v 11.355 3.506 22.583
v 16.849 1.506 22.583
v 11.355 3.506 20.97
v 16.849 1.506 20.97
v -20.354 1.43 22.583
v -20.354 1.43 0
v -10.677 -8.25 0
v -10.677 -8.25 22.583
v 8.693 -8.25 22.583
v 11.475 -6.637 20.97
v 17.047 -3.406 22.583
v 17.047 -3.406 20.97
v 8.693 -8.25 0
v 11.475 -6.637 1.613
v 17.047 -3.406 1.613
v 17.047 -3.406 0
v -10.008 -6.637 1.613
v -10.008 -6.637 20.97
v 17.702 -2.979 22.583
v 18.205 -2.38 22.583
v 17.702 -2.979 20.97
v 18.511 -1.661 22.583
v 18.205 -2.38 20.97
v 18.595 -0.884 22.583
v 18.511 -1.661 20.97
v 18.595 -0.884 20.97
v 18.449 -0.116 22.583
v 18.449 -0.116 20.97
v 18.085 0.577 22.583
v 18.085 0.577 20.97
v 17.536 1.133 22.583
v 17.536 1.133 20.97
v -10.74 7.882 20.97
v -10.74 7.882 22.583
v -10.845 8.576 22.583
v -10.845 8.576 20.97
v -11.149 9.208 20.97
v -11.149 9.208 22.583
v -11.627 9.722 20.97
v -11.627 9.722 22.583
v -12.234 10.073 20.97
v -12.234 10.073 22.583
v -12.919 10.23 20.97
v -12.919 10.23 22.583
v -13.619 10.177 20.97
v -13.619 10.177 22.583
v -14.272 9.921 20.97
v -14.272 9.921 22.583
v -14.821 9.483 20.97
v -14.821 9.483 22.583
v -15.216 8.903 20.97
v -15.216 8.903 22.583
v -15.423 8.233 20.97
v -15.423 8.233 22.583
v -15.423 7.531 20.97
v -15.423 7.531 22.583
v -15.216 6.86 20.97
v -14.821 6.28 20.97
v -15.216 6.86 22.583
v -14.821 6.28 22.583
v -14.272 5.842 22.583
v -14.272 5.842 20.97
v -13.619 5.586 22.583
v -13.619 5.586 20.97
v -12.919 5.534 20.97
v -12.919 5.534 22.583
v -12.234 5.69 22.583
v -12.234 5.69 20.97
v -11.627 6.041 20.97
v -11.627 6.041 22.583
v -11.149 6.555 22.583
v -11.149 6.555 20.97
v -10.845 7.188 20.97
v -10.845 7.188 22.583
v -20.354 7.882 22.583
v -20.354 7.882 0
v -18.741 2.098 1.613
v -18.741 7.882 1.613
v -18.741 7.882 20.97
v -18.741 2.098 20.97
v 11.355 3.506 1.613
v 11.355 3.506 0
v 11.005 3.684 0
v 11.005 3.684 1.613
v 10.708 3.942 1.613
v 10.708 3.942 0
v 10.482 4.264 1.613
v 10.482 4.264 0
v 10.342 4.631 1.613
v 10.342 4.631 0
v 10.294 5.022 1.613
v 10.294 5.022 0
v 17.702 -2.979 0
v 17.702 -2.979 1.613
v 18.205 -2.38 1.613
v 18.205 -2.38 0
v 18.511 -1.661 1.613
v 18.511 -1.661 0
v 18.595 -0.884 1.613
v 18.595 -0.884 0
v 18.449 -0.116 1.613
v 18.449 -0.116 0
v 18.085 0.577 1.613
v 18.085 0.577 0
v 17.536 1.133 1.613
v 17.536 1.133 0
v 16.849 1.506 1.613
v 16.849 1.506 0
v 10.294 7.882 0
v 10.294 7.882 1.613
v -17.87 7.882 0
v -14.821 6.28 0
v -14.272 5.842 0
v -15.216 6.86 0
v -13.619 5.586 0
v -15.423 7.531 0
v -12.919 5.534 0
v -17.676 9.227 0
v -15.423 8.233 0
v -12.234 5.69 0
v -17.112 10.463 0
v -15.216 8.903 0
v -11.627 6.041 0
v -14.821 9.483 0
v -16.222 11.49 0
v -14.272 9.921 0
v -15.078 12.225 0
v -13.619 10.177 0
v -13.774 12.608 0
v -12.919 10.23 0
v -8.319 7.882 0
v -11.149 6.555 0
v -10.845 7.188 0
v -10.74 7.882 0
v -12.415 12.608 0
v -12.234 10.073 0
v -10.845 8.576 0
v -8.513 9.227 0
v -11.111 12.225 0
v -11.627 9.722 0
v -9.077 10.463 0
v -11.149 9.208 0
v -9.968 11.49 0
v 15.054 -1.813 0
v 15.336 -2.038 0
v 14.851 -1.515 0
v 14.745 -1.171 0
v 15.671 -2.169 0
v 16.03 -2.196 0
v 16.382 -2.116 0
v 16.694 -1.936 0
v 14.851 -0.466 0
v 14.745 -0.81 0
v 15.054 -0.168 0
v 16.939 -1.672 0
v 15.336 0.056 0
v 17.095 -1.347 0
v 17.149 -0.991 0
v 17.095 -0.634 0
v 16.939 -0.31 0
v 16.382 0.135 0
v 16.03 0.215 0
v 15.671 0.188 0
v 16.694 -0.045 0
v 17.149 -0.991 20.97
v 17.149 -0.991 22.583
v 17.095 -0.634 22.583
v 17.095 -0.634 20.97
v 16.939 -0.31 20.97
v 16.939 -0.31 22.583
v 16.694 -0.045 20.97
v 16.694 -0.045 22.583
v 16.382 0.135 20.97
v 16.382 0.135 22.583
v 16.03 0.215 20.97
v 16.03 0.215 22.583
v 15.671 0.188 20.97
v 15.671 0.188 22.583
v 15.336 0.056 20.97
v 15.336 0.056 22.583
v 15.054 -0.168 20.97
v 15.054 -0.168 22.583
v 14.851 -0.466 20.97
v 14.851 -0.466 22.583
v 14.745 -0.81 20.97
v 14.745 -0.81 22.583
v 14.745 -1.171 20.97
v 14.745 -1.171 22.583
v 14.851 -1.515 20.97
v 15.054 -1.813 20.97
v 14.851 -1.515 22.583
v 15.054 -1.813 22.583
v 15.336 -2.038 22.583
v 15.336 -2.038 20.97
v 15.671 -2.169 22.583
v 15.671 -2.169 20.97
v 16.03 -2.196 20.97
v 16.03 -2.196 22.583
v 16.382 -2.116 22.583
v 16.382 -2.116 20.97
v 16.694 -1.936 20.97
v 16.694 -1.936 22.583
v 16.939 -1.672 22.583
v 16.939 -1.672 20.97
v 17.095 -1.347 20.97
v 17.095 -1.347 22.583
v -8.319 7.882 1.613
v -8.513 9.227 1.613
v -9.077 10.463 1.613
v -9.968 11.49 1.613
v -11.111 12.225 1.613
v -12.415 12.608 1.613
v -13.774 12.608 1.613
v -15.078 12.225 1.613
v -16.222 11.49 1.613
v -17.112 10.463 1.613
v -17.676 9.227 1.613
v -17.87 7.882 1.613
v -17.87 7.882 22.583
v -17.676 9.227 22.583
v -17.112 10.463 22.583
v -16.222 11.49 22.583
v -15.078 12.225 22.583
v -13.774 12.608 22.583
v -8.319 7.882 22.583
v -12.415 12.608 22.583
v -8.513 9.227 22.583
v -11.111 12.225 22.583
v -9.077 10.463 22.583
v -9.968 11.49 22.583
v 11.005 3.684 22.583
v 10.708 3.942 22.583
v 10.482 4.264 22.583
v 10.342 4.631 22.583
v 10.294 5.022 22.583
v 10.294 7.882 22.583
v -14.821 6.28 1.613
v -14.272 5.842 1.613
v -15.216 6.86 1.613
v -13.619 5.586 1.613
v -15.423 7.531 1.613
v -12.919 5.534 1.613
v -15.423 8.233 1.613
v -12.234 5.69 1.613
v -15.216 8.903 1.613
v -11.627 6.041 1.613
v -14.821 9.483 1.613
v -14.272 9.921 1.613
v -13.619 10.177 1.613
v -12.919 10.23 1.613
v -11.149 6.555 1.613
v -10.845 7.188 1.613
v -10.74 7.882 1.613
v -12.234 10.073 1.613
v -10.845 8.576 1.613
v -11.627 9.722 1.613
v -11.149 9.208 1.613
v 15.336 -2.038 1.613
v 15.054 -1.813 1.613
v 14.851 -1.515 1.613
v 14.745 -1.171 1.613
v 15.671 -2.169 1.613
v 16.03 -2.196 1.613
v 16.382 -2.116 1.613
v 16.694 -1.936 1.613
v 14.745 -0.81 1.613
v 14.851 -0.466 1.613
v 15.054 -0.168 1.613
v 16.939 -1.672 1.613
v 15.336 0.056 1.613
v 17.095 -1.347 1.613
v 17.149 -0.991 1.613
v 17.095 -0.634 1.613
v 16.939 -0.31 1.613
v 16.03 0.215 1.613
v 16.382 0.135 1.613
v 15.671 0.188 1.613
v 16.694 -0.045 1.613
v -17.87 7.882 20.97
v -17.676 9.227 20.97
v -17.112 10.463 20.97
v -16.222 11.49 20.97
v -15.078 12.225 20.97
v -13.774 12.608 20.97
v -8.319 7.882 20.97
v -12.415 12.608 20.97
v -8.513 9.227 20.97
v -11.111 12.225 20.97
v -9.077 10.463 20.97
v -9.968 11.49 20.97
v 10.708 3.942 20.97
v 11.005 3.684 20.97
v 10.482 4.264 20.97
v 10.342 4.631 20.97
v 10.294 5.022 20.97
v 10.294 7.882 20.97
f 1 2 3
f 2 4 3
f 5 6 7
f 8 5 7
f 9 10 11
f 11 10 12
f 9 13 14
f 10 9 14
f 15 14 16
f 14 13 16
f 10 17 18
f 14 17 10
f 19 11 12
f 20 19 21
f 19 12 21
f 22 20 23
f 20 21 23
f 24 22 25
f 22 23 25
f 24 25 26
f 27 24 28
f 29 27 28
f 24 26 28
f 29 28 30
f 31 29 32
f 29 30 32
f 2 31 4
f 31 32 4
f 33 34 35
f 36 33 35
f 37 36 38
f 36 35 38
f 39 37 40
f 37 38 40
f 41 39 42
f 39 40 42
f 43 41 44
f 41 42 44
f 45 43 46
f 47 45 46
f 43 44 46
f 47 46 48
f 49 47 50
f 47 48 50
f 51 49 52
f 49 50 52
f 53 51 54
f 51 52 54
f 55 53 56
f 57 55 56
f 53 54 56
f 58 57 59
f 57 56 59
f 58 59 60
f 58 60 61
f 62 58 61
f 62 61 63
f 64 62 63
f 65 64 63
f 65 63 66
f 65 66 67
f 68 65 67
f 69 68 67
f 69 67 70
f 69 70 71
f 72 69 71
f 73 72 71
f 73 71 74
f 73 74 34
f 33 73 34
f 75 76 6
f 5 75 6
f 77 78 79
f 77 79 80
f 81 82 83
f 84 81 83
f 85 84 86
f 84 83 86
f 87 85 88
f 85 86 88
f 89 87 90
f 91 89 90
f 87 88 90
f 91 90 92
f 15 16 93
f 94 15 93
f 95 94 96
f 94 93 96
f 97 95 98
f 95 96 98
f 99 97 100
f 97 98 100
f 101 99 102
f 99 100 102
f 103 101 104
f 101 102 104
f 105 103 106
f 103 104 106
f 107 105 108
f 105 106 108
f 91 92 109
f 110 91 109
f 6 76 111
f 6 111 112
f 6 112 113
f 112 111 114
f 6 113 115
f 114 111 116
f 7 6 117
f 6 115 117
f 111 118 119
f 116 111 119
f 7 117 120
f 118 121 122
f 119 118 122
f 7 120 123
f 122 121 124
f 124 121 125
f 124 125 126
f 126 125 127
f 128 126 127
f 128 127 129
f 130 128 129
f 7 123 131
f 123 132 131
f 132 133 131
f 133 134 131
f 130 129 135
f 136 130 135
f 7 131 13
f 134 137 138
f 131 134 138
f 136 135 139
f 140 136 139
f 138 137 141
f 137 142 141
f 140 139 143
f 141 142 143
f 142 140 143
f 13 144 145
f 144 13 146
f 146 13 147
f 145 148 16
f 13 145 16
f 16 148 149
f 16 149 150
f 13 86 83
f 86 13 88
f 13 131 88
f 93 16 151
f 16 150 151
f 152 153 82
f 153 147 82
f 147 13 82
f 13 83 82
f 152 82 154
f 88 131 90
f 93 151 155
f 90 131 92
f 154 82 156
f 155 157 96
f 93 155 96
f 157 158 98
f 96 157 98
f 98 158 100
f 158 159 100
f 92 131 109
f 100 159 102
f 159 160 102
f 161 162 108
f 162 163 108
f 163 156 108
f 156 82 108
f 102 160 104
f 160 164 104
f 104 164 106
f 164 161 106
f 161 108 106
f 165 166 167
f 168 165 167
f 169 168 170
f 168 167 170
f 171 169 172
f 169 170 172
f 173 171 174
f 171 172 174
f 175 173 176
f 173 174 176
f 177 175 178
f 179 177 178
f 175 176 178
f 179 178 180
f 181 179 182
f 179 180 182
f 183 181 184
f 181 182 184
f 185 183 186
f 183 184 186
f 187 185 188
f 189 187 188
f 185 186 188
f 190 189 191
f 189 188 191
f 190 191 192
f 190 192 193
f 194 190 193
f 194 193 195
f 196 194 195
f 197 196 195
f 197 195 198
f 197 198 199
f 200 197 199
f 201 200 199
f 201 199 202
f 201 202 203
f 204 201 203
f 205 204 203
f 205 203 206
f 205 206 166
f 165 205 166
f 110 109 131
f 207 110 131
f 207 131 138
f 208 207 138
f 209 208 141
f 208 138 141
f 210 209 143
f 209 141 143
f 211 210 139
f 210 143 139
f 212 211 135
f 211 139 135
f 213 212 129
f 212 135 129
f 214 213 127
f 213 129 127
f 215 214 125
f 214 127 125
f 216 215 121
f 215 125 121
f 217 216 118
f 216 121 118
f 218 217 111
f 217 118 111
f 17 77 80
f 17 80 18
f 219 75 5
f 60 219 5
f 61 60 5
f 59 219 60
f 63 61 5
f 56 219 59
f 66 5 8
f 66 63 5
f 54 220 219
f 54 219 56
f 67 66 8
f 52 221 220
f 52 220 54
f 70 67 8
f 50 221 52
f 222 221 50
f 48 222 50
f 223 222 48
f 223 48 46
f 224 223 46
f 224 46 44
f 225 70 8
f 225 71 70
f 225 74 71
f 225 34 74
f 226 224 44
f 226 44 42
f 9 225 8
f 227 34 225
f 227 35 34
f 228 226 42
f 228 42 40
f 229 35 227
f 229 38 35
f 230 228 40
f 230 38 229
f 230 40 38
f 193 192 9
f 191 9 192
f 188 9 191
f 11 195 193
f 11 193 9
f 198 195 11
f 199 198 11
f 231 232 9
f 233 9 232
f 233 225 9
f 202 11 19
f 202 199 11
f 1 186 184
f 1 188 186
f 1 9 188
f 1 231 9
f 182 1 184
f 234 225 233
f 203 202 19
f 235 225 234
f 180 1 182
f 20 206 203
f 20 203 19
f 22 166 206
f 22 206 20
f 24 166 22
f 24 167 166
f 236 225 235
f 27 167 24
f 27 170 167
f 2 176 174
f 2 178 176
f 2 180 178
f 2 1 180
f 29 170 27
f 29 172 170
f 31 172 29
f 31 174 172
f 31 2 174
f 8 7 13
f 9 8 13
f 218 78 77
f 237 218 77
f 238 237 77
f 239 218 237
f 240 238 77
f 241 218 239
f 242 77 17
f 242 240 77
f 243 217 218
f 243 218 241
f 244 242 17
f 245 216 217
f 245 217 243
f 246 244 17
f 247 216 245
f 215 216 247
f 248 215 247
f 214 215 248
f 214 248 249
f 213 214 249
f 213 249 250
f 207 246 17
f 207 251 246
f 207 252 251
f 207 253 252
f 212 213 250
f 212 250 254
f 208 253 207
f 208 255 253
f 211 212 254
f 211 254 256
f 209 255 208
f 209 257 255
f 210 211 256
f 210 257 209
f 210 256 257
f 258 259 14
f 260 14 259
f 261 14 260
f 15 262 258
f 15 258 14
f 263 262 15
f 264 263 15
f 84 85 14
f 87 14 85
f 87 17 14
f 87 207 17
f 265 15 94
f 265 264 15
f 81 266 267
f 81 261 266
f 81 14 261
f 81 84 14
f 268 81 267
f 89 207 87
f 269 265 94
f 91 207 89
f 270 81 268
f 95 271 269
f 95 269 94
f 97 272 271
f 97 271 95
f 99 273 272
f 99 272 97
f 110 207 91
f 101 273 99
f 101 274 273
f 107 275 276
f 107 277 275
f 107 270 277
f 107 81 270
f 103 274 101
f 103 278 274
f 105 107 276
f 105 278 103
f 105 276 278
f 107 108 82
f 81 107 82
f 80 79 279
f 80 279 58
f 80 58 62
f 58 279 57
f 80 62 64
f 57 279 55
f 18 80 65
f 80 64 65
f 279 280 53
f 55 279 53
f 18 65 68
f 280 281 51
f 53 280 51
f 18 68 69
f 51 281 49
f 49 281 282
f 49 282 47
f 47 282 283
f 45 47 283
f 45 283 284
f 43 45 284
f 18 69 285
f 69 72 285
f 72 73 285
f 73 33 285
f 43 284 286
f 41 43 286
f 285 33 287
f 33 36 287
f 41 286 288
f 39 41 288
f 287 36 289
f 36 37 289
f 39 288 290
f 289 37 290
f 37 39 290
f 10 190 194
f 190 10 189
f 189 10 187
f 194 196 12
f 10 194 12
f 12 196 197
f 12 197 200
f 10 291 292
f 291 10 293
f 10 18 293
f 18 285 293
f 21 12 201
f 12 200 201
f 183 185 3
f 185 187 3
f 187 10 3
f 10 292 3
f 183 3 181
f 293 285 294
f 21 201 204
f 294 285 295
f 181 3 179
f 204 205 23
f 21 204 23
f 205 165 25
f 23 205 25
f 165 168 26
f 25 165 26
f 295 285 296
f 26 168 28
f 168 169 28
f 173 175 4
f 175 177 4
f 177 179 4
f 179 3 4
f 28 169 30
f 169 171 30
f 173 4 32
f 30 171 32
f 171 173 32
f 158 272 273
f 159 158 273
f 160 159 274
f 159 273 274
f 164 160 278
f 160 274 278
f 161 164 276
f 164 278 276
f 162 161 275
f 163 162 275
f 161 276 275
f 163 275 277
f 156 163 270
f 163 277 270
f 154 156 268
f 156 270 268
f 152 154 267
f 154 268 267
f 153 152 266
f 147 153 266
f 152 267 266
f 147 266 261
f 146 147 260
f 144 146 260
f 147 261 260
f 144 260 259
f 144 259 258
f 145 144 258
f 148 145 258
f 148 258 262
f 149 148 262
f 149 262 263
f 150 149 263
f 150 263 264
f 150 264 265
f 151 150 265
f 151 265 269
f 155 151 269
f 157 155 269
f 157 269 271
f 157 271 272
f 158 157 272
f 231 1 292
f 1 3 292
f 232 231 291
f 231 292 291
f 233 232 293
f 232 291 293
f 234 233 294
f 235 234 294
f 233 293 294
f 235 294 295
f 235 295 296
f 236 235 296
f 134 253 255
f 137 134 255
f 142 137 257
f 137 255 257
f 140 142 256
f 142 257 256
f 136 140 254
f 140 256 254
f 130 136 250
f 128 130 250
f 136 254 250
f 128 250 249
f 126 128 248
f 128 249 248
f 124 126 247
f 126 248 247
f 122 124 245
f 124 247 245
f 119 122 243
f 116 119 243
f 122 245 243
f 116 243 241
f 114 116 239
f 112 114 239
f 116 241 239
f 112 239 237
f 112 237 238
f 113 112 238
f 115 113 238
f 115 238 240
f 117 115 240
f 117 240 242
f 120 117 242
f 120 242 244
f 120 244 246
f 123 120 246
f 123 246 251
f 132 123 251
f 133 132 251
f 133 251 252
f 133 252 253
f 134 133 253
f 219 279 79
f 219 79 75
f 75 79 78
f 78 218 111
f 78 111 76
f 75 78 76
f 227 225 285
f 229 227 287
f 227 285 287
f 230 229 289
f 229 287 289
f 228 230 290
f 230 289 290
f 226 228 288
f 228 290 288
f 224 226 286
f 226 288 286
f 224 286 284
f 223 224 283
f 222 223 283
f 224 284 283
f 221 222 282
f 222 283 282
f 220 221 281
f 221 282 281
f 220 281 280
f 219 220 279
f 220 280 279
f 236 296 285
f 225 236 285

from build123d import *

# Parameters (mm, degrees)
BOSS_EXTRUDE2_DEPTH = 22.58314
SHELL3_T            = -1.6129
SKETCH2_R           = 2.35458
SKETCH2_R_2         = 1.20904
CUT_EXTRUDE1_DEPTH  = 23.58314


with BuildPart() as part:
    # Sketch1 → Boss-Extrude2 (new body)
    with BuildSketch(Plane.XY):
        with BuildLine():
            Line((-17.869818431, 7.881581433), (-20.353938431, 7.881581433))
            Line((-20.353938431, 7.881581433), (-20.353938431, 1.429981433))
            Line((-20.353938431, 1.429981433), (-10.676538431, -8.249958567))
            Line((-10.676538431, -8.249958567), (8.693302541, -8.249958567))
            Line((8.693302541, -8.249958567), (17.046970588, -3.405940625))
            ThreePointArc((17.046970588, -3.405940625), (18.594805131, -0.883615337), (16.848949341, 1.505925245))
            Line((16.848949341, 1.505925245), (11.35487534, 3.505941031))
            ThreePointArc((11.35487534, 3.505941031), (10.585366229, 4.096455714), (10.293701569, 5.021541433))
            Line((10.293701569, 5.021541433), (10.293701569, 7.881581433))
            Line((10.293701569, 7.881581433), (-8.319418431, 7.881581433))
            ThreePointArc((-8.319418431, 7.881581433), (-13.094618431, 12.656781433), (-17.869818431, 7.881581433))
        make_face()
    extrude(amount=BOSS_EXTRUDE2_DEPTH)

    # Shell3
    shell3_openings = [part.faces().sort_by_distance(p)[0] for p in [
        (0.987141569, 7.881581433, 11.29157),
        (10.293701569, 6.451561433, 11.29157),
        (10.704827342, 4.180098473, 11.29157),
        (14.10191234, 2.505933138, 11.29157),
        (17.771382548, -0.916811514, 11.29157),
        (12.870136565, -5.827949596, 11.29157),
        (-19.111878431, 7.881581433, 11.29157),
        (-13.094618431, 10.269181433, 11.29157),
    ]]
    offset(amount=SHELL3_T, openings=shell3_openings, kind=Kind.INTERSECTION)

    # Sketch2 → Cut-Extrude1 (cut, through all)
    with BuildSketch(Plane.XY.offset(22.58314)):
        with Locations((-13.094618431, 7.881581433)):
            Circle(SKETCH2_R)
        with Locations((15.940121569, -0.990638567)):
            Circle(SKETCH2_R_2)
    extrude(amount=-CUT_EXTRUDE1_DEPTH, mode=Mode.SUBTRACT)


solid = part.part
